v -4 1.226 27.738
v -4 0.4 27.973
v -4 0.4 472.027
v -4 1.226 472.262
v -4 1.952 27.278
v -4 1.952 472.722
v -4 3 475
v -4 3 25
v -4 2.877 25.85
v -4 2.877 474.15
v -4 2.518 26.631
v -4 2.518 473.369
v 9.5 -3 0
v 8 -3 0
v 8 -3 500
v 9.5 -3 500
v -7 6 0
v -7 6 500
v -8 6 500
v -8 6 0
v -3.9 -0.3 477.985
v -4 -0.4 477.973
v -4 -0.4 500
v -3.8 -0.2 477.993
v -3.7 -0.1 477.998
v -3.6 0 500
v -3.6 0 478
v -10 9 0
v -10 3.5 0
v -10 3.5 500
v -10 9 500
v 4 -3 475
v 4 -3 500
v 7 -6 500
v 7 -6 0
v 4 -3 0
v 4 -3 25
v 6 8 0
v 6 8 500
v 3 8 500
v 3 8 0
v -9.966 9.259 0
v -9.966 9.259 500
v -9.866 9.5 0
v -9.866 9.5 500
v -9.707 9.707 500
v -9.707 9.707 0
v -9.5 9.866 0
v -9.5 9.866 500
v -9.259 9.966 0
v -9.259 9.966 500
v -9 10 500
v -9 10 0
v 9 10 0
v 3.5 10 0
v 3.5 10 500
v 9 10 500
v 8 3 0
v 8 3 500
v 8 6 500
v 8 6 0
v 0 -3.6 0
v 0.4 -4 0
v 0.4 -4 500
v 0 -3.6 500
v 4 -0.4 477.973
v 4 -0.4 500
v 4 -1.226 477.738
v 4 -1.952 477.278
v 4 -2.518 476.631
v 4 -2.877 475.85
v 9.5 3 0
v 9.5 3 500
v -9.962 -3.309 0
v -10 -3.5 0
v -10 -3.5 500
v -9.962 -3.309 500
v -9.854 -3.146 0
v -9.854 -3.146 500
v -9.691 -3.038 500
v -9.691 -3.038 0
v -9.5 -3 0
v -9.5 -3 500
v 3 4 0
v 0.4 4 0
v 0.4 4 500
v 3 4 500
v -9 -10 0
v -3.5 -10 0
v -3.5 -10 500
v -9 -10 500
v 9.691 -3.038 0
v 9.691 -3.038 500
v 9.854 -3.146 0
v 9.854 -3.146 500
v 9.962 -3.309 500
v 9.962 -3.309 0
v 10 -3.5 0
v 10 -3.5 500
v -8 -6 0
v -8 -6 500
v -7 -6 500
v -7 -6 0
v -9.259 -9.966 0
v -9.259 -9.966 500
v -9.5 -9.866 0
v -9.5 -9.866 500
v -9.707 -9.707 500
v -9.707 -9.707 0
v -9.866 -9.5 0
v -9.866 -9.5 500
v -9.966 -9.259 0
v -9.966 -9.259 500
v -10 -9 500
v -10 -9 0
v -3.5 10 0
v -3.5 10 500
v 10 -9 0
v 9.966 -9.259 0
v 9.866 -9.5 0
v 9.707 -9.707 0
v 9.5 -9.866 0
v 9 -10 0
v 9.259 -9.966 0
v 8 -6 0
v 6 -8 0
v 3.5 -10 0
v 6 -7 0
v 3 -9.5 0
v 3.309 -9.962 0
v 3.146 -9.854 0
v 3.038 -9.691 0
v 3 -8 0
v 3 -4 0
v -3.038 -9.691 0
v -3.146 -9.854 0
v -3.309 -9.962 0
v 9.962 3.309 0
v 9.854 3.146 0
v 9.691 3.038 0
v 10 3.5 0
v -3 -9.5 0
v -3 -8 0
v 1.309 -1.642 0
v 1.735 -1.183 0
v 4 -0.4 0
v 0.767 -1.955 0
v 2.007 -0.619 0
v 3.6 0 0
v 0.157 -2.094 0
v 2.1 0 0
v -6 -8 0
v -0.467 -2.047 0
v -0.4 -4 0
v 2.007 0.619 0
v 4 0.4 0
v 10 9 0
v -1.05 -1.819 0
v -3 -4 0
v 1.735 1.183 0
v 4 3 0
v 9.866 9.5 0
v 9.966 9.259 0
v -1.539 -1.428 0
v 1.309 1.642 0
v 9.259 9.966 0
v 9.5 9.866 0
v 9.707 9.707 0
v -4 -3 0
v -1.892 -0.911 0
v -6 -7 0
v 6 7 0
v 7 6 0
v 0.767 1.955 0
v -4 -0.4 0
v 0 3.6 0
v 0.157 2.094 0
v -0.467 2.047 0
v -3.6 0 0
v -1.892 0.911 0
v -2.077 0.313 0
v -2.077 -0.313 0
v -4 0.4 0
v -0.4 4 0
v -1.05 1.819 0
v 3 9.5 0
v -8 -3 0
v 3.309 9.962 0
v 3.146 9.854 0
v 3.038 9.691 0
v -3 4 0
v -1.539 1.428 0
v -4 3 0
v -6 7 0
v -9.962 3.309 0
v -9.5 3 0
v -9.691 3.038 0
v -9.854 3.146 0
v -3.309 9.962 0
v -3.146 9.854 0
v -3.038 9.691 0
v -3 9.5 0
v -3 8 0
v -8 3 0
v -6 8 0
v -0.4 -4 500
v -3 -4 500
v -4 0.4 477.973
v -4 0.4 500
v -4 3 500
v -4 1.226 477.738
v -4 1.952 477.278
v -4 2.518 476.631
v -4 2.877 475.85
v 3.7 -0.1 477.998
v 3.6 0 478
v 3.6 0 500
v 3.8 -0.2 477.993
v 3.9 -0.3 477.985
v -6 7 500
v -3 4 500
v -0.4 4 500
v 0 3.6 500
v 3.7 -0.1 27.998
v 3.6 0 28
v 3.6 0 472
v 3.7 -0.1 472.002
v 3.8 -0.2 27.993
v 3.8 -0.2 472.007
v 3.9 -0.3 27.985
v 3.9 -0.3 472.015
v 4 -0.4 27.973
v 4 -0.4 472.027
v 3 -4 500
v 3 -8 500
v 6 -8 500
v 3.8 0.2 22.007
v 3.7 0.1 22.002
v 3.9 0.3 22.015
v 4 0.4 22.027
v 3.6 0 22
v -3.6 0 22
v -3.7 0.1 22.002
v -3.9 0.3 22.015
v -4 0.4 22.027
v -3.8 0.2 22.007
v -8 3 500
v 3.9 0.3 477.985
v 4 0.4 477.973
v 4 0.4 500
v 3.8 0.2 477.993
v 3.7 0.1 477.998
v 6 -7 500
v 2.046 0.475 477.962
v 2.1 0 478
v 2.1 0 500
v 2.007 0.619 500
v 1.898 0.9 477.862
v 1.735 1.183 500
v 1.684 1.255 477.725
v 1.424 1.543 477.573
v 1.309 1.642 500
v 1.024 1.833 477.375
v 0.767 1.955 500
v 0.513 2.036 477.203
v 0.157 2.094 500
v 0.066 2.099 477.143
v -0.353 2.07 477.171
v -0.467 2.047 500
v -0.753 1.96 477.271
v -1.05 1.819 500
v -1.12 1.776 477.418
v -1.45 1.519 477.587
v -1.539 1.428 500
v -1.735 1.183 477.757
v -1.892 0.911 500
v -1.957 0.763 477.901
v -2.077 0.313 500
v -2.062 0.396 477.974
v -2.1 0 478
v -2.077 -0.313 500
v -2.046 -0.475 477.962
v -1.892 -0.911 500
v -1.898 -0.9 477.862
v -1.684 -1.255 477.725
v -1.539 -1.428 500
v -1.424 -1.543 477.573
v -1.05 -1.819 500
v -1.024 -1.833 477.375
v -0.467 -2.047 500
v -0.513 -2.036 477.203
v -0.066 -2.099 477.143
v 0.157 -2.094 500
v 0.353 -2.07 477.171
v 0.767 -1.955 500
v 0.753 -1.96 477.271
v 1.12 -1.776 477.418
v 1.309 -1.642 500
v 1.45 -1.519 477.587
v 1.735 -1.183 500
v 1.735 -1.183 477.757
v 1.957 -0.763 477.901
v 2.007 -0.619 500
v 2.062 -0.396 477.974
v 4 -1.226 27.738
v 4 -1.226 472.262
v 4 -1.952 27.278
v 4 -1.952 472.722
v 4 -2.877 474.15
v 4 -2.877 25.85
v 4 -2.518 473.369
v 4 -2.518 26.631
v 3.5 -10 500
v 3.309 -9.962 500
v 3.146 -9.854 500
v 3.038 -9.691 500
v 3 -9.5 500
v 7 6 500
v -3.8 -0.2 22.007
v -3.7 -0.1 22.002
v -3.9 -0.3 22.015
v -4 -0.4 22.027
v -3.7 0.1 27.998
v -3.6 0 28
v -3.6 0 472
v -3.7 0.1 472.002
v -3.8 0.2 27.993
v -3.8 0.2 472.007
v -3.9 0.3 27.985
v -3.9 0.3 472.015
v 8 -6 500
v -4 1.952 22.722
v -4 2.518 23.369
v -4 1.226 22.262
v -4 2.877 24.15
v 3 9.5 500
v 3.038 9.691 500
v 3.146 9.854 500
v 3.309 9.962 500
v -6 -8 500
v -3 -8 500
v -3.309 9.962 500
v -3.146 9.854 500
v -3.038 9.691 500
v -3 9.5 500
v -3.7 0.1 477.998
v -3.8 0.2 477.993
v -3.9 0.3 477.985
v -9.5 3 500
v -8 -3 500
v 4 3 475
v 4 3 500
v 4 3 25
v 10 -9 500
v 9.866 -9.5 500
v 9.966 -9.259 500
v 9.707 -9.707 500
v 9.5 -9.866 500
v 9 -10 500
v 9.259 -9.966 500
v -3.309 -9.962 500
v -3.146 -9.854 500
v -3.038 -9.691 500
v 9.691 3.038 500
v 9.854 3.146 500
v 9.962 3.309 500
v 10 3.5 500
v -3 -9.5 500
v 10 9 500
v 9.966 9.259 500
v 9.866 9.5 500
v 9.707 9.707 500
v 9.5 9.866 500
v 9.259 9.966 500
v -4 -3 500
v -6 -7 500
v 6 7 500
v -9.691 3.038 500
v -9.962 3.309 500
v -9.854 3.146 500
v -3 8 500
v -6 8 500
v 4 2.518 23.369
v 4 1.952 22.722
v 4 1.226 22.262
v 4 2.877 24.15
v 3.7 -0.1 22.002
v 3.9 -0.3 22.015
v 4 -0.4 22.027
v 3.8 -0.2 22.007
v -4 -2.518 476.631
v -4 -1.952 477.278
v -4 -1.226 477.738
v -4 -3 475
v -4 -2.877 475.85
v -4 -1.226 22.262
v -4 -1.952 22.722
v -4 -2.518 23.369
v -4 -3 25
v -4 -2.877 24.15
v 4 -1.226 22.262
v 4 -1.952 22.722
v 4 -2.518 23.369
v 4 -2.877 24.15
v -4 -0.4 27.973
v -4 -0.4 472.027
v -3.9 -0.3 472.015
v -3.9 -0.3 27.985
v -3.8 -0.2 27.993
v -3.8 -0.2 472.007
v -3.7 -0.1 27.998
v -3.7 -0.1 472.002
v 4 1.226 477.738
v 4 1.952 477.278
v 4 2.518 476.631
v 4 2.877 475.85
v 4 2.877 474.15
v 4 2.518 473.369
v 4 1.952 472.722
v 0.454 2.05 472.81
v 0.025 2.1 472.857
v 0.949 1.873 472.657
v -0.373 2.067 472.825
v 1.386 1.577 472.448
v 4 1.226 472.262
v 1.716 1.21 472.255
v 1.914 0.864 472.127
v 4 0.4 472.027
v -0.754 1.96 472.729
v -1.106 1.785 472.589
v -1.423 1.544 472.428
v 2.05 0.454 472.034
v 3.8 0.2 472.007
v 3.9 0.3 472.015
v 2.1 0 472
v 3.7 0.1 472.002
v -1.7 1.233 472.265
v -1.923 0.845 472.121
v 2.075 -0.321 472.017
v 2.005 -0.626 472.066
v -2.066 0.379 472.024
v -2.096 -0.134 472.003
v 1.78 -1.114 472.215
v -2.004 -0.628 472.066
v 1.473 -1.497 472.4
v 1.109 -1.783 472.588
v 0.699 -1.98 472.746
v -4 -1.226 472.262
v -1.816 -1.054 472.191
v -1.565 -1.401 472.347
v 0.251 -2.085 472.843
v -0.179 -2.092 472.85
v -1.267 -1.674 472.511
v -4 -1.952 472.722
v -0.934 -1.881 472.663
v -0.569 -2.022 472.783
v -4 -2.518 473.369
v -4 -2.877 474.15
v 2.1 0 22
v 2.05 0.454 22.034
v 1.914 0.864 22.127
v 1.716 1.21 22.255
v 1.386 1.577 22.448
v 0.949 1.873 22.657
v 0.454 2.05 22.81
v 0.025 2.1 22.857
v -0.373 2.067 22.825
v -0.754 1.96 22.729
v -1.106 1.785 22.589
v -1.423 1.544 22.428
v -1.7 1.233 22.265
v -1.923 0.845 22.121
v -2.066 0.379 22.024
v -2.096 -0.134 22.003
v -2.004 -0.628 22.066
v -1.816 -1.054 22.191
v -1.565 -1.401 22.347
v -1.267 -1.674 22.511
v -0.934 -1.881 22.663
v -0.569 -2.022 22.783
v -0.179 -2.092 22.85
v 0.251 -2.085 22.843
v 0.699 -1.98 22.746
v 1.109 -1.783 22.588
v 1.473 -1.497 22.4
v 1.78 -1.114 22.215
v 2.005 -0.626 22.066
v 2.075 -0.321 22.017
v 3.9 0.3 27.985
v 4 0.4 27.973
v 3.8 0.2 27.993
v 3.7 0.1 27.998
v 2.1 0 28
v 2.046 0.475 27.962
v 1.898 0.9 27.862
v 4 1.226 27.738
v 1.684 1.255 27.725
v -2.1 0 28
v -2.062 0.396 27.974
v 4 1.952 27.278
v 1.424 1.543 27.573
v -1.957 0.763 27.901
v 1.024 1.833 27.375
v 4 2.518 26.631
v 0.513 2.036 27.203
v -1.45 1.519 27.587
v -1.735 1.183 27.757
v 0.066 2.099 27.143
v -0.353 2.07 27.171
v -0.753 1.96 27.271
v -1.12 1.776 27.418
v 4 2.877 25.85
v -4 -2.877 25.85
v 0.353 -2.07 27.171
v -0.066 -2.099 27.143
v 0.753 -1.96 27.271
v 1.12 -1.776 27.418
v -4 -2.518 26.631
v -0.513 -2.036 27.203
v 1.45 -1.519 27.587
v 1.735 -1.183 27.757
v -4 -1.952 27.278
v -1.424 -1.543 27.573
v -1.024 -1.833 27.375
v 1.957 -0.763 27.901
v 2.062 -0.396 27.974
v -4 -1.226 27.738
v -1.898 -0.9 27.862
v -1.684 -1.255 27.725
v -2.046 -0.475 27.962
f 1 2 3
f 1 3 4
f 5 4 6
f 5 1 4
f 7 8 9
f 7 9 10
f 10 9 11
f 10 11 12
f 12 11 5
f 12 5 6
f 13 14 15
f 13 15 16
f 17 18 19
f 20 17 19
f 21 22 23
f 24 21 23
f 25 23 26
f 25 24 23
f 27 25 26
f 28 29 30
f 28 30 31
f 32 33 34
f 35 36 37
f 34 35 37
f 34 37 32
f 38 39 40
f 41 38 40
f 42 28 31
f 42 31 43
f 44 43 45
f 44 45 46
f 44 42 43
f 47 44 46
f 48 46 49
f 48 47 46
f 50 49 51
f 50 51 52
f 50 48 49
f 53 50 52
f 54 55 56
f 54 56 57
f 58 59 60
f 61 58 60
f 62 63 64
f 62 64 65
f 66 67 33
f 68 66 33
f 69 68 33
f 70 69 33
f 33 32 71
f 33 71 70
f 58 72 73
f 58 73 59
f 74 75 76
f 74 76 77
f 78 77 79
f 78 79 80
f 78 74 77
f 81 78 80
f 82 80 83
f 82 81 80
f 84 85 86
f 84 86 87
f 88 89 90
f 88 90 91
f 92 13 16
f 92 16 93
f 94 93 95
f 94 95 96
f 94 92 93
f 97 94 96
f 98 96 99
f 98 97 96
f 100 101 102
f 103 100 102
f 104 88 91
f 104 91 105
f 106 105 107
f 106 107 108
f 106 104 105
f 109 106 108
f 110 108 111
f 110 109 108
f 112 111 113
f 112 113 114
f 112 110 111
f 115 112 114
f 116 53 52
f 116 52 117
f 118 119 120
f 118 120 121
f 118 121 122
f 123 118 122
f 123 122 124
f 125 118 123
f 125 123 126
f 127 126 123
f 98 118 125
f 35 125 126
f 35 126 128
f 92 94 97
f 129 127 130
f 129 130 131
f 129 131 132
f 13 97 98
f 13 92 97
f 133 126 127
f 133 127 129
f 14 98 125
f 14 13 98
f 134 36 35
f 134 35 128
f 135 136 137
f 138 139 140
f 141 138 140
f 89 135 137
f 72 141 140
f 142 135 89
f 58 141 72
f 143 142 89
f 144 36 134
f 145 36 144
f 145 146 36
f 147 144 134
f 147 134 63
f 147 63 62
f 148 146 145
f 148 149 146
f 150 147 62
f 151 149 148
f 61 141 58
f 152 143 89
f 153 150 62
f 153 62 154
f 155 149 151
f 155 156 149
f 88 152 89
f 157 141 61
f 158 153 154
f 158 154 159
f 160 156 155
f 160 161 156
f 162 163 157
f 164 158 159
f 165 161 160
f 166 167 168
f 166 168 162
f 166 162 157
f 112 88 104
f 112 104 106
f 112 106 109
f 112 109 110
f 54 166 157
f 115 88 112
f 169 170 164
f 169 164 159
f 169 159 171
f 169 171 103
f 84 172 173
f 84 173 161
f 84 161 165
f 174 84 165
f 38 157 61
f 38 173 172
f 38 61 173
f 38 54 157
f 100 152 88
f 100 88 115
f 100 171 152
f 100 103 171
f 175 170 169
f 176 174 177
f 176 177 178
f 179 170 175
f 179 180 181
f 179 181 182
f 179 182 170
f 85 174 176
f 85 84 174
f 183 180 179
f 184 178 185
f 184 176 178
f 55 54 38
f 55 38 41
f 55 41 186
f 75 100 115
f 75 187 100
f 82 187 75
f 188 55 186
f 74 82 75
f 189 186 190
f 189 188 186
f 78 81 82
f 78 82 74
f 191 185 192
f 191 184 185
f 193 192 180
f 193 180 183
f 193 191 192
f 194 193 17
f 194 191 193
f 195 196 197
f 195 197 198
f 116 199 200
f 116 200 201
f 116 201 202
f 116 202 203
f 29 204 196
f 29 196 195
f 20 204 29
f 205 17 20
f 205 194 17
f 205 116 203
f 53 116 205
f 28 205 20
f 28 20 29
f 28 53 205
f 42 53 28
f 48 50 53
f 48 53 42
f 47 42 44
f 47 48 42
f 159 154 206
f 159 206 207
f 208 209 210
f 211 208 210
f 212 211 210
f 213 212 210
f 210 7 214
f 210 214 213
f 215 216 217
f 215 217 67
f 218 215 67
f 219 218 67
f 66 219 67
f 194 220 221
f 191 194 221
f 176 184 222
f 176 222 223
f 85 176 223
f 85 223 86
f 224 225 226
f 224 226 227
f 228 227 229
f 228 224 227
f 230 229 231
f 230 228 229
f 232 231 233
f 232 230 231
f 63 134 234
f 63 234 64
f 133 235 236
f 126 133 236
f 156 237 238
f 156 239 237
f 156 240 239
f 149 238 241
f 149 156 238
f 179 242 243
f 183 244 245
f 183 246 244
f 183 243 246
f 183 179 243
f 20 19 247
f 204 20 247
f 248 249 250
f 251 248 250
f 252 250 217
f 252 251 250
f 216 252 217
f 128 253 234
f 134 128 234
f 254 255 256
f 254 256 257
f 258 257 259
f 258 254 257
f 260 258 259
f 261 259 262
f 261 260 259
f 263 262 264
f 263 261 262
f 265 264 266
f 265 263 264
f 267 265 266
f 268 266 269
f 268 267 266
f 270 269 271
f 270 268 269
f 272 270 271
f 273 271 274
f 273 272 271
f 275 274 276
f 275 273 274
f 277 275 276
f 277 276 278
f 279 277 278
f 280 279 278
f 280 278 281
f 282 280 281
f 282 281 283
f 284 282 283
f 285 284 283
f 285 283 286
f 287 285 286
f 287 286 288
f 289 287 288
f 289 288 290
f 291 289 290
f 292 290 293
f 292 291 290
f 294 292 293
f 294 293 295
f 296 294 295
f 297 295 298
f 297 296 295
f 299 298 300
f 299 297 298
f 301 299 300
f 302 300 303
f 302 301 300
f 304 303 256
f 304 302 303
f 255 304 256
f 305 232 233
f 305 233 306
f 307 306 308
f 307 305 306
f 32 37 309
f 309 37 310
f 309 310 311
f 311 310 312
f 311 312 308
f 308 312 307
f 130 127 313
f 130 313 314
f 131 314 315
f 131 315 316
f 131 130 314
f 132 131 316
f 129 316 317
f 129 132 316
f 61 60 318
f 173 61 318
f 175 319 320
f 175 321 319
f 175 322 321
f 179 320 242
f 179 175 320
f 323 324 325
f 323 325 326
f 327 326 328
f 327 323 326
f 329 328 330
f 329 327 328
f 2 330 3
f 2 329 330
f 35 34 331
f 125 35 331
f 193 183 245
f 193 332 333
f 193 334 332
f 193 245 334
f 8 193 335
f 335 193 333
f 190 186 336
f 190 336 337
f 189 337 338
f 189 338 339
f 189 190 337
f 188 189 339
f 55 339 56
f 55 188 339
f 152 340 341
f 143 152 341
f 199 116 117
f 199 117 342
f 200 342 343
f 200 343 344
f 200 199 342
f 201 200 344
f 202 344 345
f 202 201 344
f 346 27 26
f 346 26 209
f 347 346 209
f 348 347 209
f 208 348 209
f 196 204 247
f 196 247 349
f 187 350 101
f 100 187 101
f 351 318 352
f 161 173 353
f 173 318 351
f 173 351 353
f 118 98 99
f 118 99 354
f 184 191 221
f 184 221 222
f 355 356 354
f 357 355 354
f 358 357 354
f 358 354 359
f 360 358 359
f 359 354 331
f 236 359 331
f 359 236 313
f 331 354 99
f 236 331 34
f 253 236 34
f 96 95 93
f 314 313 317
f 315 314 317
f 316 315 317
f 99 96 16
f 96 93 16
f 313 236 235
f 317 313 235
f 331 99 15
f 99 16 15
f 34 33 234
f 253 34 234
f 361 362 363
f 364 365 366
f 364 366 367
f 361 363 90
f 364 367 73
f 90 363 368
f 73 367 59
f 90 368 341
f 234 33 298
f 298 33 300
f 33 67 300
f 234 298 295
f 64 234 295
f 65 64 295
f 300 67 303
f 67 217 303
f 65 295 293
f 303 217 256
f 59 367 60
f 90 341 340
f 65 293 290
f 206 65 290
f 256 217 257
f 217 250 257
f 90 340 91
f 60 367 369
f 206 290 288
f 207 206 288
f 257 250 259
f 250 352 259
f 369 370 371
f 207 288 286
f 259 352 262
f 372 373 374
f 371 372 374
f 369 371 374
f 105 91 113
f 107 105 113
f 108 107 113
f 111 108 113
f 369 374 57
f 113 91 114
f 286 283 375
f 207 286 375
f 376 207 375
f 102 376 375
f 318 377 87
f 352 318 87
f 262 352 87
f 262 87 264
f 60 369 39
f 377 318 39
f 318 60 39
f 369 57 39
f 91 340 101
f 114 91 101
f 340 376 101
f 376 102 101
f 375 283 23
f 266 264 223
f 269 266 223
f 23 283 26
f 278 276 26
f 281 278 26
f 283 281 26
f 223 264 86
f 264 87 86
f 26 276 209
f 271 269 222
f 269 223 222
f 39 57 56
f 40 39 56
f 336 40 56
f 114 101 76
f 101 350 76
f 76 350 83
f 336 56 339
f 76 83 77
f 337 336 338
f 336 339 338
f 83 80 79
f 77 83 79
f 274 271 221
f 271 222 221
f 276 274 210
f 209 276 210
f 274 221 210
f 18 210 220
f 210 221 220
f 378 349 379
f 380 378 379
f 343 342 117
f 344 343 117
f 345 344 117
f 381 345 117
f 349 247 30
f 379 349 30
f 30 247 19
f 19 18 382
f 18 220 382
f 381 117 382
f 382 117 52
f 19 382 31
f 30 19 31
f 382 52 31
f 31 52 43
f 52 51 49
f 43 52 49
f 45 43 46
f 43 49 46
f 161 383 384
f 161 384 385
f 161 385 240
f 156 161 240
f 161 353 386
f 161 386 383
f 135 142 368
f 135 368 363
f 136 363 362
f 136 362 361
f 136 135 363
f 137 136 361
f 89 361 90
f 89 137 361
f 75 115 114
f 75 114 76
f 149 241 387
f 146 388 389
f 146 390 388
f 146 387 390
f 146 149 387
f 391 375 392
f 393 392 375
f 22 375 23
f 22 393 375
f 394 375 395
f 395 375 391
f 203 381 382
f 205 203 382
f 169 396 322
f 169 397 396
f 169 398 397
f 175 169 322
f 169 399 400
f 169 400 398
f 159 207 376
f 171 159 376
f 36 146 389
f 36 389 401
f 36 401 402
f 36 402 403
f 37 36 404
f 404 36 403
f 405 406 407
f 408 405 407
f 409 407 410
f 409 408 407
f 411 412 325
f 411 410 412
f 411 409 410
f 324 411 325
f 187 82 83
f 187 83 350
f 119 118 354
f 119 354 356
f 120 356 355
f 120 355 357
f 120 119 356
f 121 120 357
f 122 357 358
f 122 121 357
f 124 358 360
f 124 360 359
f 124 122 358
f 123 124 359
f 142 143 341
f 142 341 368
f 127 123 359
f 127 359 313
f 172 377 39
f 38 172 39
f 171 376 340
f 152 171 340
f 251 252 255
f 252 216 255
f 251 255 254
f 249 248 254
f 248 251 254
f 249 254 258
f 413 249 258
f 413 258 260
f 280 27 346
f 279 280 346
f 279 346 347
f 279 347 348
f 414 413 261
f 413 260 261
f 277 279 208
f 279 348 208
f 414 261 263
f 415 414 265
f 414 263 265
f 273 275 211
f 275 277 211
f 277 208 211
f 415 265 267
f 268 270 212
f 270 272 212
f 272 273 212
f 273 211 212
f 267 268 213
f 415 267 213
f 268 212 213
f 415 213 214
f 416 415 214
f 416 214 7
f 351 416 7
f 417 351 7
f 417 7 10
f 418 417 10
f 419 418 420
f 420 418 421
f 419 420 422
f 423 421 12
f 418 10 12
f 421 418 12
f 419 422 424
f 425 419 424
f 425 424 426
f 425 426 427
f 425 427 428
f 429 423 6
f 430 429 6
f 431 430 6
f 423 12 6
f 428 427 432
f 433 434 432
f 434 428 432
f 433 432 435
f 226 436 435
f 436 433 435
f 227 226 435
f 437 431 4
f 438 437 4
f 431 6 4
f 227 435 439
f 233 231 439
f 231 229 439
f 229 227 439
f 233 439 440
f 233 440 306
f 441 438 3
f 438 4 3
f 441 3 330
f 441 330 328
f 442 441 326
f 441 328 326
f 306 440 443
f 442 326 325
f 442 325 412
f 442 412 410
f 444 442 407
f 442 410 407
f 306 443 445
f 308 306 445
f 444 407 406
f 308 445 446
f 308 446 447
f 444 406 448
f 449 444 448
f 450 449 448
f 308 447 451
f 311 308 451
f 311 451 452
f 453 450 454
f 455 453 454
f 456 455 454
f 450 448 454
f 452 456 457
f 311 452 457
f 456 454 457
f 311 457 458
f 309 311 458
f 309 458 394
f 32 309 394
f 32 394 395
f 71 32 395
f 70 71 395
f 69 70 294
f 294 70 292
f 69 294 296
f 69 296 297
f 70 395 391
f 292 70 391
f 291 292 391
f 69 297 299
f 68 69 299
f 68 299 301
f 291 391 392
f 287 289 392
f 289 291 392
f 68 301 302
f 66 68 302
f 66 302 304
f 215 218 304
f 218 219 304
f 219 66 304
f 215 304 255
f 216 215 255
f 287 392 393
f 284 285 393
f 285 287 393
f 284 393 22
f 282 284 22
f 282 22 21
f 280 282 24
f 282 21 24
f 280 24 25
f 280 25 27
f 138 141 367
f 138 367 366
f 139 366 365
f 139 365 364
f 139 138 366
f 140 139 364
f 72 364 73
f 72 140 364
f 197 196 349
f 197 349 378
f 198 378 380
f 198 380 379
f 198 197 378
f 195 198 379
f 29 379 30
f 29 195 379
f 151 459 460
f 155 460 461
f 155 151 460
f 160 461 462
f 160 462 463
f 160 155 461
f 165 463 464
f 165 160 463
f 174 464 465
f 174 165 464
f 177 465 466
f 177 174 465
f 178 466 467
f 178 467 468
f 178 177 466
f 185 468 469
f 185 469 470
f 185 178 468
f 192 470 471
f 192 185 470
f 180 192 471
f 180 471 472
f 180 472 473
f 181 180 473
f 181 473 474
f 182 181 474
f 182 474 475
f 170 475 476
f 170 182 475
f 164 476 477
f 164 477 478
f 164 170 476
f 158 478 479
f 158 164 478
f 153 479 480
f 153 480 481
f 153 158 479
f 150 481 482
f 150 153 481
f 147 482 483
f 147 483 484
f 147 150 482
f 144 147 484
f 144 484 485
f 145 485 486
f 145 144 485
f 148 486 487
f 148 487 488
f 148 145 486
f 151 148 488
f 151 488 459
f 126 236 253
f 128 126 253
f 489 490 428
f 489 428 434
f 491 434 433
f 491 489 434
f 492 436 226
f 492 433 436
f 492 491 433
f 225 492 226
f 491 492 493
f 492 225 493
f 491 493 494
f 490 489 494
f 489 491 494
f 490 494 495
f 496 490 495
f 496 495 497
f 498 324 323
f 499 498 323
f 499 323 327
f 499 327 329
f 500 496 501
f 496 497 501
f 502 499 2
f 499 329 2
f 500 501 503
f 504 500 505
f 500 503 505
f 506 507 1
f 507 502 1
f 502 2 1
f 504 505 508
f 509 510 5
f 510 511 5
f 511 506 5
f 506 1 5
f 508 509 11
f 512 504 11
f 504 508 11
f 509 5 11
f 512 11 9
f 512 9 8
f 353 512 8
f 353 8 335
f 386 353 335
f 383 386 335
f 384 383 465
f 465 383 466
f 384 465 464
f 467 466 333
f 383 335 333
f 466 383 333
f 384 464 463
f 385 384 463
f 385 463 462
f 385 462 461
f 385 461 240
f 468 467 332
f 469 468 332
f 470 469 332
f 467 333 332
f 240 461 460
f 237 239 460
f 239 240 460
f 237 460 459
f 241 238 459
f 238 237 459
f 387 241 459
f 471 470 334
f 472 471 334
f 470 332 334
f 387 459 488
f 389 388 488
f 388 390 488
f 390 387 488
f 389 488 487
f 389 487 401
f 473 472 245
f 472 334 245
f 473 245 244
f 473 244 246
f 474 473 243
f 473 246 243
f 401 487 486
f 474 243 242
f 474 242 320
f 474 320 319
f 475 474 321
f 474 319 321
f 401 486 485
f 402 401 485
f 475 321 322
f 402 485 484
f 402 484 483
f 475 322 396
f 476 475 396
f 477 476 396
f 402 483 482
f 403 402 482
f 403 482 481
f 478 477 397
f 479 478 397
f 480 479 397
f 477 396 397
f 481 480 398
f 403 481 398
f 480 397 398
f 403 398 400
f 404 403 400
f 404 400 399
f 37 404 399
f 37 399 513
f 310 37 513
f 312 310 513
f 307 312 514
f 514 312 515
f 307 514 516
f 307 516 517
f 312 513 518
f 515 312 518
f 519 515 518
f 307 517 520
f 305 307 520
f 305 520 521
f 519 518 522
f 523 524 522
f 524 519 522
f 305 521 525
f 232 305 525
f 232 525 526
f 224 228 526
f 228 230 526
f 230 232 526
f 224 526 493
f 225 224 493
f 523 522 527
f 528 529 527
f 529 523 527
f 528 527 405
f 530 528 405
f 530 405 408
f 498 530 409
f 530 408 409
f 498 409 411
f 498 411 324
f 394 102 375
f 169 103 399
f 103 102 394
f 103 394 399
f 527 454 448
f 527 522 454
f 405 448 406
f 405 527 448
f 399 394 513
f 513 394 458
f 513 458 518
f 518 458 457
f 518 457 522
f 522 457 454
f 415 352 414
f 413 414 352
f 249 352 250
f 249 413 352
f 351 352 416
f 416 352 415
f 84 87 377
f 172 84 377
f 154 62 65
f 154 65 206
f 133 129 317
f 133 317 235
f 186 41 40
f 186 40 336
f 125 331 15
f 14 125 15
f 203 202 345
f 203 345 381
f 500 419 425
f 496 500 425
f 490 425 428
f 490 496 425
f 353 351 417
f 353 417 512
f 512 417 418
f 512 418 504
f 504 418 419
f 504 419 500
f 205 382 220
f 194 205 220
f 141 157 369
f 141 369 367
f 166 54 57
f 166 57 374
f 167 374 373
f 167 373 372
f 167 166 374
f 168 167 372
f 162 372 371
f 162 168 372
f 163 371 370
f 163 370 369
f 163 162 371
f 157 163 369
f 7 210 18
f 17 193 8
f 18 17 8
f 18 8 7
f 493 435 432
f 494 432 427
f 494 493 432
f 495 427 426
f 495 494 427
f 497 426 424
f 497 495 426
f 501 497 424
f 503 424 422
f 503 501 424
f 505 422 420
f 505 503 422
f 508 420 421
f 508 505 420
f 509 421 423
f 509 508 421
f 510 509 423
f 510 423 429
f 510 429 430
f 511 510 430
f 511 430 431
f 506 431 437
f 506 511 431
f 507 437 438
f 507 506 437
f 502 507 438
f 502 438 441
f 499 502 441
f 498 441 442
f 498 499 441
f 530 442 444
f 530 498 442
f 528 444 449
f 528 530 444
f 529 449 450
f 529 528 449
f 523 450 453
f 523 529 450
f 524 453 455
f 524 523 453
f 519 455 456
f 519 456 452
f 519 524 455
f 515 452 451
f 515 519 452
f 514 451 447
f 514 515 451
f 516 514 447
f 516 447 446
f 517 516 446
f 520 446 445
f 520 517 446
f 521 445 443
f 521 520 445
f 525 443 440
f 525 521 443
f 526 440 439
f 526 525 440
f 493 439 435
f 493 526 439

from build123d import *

# Parameters (mm, degrees)
SCHIZZO1_R                   = 2.1
ESTRUSIONE_ESTRUSIONE1_DEPTH = 500
SCHIZZO2_R                   = 3
TAGLIO_ESTRUSIONE1_DEPTH     = 15


with BuildPart() as part:
    # Schizzo1 → Estrusione-Estrusione1 (new body)
    with BuildSketch(Plane.XY):
        with BuildLine():
            Line((-3.6, 0), (-4, 0.4))
            Line((-4, 0.4), (-4, 3))
            Line((-4, 3), (-7, 6))
            Line((-7, 6), (-8, 6))
            Line((-8, 6), (-8, 3))
            Line((-8, 3), (-9.5, 3))
            ThreePointArc((-9.5, 3), (-9.853553391, 3.146446609), (-10, 3.5))
            Line((-10, 3.5), (-10, 9))
            ThreePointArc((-10, 9), (-9.707106781, 9.707106781), (-9, 10))
            Line((-9, 10), (-3.5, 10))
            ThreePointArc((-3.5, 10), (-3.146446609, 9.853553391), (-3, 9.5))
            Line((-3, 9.5), (-3, 8))
            Line((-3, 8), (-6, 8))
            Line((-6, 8), (-6, 7))
            Line((-6, 7), (-3, 4))
            Line((-3, 4), (-0.4, 4))
            Line((-0.4, 4), (0, 3.6))
            Line((0, 3.6), (0.4, 4))
            Line((0.4, 4), (3, 4))
            Line((3, 4), (6, 7))
            Line((6, 7), (6, 8))
            Line((6, 8), (3, 8))
            Line((3, 8), (3, 9.5))
            ThreePointArc((3, 9.5), (3.146446609, 9.853553391), (3.5, 10))
            Line((3.5, 10), (9, 10))
            ThreePointArc((9, 10), (9.707106781, 9.707106781), (10, 9))
            Line((10, 9), (10, 3.5))
            ThreePointArc((10, 3.5), (9.853553391, 3.146446609), (9.5, 3))
            Line((9.5, 3), (8, 3))
            Line((8, 3), (8, 6))
            Line((8, 6), (7, 6))
            Line((7, 6), (4, 3))
            Line((4, 3), (4, 0.4))
            Line((4, 0.4), (3.6, 0))
            Line((3.6, 0), (4, -0.4))
            Line((4, -0.4), (4, -3))
            Line((4, -3), (7, -6))
            Line((7, -6), (8, -6))
            Line((8, -6), (8, -3))
            Line((8, -3), (9.5, -3))
            ThreePointArc((9.5, -3), (9.853553391, -3.146446609), (10, -3.5))
            Line((10, -3.5), (10, -9))
            ThreePointArc((10, -9), (9.707106781, -9.707106781), (9, -10))
            Line((9, -10), (3.5, -10))
            ThreePointArc((3.5, -10), (3.146446609, -9.853553391), (3, -9.5))
            Line((3, -9.5), (3, -8))
            Line((3, -8), (6, -8))
            Line((6, -8), (6, -7))
            Line((6, -7), (3, -4))
            Line((3, -4), (0.4, -4))
            Line((0.4, -4), (0, -3.6))
            Line((0, -3.6), (-0.4, -4))
            Line((-0.4, -4), (-3, -4))
            Line((-3, -4), (-6, -7))
            Line((-6, -7), (-6, -8))
            Line((-6, -8), (-3, -8))
            Line((-3, -8), (-3, -9.5))
            ThreePointArc((-3, -9.5), (-3.146446609, -9.853553391), (-3.5, -10))
            Line((-3.5, -10), (-9, -10))
            ThreePointArc((-9, -10), (-9.707106781, -9.707106781), (-10, -9))
            Line((-10, -9), (-10, -3.5))
            ThreePointArc((-10, -3.5), (-9.853553391, -3.146446609), (-9.5, -3))
            Line((-9.5, -3), (-8, -3))
            Line((-8, -3), (-8, -6))
            Line((-8, -6), (-7, -6))
            Line((-7, -6), (-4, -3))
            Line((-4, -3), (-4, -0.4))
            Line((-4, -0.4), (-3.6, 0))
        make_face()
        Circle(SCHIZZO1_R, mode=Mode.SUBTRACT)
    extrude(amount=ESTRUSIONE_ESTRUSIONE1_DEPTH)

    # Schizzo2 → Taglio-Estrusione1 (cut, through all)
    with BuildSketch(Plane.ZY.offset(4)):
        with Locations((25, 0)):
            Circle(SCHIZZO2_R)
        with Locations((475, 0)):
            Circle(SCHIZZO2_R)
    extrude(amount=-TAGLIO_ESTRUSIONE1_DEPTH, mode=Mode.SUBTRACT)


solid = part.part
